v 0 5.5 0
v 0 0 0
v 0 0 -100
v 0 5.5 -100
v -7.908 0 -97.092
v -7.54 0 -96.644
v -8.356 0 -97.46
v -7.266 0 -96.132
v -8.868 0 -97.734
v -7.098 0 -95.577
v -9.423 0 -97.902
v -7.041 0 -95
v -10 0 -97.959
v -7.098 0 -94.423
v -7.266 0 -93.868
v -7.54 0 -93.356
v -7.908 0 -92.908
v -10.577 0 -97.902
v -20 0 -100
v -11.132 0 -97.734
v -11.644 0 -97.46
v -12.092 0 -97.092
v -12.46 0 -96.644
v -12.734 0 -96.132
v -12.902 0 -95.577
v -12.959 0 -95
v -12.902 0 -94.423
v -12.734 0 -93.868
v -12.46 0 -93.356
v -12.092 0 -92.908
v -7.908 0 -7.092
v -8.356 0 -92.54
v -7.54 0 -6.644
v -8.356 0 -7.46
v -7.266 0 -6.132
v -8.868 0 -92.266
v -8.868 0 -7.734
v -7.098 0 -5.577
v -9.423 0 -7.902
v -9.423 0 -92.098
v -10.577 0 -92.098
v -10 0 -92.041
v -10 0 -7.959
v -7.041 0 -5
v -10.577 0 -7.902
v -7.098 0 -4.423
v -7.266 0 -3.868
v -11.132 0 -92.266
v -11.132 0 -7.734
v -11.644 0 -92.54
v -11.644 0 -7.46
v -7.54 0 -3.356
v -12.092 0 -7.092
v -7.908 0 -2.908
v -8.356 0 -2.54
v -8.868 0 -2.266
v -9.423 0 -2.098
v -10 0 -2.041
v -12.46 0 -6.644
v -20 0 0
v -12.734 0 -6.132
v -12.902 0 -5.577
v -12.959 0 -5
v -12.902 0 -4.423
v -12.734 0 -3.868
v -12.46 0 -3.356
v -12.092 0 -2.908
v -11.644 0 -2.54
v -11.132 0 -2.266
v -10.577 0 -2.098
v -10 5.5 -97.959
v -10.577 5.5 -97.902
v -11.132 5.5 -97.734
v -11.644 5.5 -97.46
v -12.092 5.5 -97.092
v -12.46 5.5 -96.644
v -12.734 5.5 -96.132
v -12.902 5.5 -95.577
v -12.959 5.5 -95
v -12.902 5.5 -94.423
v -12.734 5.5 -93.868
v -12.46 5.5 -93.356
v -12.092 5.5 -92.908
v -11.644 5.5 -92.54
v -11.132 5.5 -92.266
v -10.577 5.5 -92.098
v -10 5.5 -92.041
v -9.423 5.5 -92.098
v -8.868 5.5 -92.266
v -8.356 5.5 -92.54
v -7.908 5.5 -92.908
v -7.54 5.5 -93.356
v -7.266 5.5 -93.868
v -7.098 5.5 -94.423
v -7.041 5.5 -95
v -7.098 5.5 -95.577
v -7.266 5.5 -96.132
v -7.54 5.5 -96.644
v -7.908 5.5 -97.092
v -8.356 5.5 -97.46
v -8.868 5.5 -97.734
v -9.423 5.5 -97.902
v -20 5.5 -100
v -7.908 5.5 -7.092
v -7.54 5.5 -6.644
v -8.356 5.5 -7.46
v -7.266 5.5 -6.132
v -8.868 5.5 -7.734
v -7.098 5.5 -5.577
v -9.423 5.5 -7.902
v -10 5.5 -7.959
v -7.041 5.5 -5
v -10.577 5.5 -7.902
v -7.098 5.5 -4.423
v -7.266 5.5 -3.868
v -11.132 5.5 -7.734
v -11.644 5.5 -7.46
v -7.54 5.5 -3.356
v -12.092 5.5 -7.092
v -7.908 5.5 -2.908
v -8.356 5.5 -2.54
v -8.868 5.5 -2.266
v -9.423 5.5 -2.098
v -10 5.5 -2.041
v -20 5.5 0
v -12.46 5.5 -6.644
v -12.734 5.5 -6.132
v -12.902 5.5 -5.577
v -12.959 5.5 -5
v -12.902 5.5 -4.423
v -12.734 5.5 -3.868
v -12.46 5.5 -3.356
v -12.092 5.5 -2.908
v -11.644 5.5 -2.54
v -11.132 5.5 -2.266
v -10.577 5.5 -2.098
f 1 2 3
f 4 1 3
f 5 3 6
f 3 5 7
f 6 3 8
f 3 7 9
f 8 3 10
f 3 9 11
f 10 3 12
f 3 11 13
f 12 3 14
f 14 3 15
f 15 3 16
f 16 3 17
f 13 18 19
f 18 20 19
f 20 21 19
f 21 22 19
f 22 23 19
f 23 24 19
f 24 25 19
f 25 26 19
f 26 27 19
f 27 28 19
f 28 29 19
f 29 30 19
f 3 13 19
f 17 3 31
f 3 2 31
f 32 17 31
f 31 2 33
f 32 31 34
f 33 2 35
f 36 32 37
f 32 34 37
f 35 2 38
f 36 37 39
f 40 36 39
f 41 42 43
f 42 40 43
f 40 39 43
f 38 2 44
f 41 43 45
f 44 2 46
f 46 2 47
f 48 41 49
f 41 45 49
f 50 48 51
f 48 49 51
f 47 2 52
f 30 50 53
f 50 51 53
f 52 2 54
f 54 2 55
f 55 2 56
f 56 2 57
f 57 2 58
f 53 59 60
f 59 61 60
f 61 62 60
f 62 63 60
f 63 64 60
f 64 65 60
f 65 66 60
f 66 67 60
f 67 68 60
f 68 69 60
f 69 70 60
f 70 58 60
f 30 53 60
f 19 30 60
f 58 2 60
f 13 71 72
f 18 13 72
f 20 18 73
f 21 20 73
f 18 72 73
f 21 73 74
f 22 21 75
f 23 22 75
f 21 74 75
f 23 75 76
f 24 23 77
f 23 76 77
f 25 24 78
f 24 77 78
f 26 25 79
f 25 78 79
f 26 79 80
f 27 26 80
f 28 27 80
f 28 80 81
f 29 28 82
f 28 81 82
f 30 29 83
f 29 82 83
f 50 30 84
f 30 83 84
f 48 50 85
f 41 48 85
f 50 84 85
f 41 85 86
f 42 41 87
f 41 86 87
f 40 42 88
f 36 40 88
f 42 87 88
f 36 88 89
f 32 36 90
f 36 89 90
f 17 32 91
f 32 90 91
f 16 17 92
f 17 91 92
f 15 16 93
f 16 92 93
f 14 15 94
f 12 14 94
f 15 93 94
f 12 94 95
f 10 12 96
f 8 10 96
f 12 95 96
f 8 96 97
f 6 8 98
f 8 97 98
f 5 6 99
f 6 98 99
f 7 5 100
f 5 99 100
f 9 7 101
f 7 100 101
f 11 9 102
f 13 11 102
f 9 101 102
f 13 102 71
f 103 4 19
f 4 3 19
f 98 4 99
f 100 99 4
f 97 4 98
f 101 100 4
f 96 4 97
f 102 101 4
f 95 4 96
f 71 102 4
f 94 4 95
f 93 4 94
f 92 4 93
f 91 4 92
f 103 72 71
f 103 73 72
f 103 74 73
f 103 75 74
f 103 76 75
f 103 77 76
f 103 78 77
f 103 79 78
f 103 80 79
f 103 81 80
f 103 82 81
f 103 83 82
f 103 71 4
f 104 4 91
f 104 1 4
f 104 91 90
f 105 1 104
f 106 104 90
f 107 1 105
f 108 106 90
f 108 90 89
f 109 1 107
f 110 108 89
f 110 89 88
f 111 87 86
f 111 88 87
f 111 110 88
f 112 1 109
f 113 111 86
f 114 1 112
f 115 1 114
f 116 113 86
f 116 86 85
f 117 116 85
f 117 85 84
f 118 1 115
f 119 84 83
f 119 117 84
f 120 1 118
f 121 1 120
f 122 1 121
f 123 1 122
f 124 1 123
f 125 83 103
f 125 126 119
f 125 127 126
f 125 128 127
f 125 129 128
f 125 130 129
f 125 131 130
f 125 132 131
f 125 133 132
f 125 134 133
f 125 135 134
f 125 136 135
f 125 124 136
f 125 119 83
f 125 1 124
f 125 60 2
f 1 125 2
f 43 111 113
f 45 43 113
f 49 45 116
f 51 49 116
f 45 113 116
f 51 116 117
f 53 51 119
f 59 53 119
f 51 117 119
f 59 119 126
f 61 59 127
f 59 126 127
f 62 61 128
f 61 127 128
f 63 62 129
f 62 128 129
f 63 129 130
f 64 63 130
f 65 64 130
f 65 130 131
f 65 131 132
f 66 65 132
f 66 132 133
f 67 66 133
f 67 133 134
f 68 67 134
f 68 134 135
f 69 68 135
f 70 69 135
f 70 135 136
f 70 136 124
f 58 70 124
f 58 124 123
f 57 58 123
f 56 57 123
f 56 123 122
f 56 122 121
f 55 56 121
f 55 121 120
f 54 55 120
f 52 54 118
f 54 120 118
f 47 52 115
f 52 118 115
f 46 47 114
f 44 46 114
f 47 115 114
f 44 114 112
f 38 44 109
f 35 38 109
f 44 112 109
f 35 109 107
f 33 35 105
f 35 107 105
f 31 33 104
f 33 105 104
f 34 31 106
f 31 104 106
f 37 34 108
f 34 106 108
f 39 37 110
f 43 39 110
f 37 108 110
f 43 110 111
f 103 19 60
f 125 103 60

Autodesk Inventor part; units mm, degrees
ref_plane "YZ Plane" through (0, 0, 0) normal (1, 0, 0) x (0, 1, 0)
ref_plane "XZ Plane" through (0, 0, 0) normal (0, 1, 0) x (-1, 0, 0)
ref_plane "XY Plane" through (0, 0, 0) normal (0, 0, 1) x (1, 0, 0)
sketch "Sketch1" plane through (0, 0, 0) normal (0, 1, 0) x (-1, 0, 0)
  line L0 (0, 0) -> (0, -100)
  line L1 (0, -100) -> (20, -100)
  line L2 (20, -100) -> (20, 0)
  line L3 (20, 0) -> (0, 0)
  point P0 (10, -5)
  point P1 (10, -95)
  dimension "d0" = 100
  dimension "d1" = 20
  dimension "d2" = 90
  dimension "d3" = 5
extrude "Extrusion1" add sketch "Sketch1" along normal blind 5.5
hole "Hole1" at (-10, 0, -5) at (-10, 0, -95) direction (0, 1, 0) diameter 5.9175 depth 19.1 tip angle 118 thread size "M7x1" class "6H" standard "ANSI Metric M Profile"
properties part number "CB"
